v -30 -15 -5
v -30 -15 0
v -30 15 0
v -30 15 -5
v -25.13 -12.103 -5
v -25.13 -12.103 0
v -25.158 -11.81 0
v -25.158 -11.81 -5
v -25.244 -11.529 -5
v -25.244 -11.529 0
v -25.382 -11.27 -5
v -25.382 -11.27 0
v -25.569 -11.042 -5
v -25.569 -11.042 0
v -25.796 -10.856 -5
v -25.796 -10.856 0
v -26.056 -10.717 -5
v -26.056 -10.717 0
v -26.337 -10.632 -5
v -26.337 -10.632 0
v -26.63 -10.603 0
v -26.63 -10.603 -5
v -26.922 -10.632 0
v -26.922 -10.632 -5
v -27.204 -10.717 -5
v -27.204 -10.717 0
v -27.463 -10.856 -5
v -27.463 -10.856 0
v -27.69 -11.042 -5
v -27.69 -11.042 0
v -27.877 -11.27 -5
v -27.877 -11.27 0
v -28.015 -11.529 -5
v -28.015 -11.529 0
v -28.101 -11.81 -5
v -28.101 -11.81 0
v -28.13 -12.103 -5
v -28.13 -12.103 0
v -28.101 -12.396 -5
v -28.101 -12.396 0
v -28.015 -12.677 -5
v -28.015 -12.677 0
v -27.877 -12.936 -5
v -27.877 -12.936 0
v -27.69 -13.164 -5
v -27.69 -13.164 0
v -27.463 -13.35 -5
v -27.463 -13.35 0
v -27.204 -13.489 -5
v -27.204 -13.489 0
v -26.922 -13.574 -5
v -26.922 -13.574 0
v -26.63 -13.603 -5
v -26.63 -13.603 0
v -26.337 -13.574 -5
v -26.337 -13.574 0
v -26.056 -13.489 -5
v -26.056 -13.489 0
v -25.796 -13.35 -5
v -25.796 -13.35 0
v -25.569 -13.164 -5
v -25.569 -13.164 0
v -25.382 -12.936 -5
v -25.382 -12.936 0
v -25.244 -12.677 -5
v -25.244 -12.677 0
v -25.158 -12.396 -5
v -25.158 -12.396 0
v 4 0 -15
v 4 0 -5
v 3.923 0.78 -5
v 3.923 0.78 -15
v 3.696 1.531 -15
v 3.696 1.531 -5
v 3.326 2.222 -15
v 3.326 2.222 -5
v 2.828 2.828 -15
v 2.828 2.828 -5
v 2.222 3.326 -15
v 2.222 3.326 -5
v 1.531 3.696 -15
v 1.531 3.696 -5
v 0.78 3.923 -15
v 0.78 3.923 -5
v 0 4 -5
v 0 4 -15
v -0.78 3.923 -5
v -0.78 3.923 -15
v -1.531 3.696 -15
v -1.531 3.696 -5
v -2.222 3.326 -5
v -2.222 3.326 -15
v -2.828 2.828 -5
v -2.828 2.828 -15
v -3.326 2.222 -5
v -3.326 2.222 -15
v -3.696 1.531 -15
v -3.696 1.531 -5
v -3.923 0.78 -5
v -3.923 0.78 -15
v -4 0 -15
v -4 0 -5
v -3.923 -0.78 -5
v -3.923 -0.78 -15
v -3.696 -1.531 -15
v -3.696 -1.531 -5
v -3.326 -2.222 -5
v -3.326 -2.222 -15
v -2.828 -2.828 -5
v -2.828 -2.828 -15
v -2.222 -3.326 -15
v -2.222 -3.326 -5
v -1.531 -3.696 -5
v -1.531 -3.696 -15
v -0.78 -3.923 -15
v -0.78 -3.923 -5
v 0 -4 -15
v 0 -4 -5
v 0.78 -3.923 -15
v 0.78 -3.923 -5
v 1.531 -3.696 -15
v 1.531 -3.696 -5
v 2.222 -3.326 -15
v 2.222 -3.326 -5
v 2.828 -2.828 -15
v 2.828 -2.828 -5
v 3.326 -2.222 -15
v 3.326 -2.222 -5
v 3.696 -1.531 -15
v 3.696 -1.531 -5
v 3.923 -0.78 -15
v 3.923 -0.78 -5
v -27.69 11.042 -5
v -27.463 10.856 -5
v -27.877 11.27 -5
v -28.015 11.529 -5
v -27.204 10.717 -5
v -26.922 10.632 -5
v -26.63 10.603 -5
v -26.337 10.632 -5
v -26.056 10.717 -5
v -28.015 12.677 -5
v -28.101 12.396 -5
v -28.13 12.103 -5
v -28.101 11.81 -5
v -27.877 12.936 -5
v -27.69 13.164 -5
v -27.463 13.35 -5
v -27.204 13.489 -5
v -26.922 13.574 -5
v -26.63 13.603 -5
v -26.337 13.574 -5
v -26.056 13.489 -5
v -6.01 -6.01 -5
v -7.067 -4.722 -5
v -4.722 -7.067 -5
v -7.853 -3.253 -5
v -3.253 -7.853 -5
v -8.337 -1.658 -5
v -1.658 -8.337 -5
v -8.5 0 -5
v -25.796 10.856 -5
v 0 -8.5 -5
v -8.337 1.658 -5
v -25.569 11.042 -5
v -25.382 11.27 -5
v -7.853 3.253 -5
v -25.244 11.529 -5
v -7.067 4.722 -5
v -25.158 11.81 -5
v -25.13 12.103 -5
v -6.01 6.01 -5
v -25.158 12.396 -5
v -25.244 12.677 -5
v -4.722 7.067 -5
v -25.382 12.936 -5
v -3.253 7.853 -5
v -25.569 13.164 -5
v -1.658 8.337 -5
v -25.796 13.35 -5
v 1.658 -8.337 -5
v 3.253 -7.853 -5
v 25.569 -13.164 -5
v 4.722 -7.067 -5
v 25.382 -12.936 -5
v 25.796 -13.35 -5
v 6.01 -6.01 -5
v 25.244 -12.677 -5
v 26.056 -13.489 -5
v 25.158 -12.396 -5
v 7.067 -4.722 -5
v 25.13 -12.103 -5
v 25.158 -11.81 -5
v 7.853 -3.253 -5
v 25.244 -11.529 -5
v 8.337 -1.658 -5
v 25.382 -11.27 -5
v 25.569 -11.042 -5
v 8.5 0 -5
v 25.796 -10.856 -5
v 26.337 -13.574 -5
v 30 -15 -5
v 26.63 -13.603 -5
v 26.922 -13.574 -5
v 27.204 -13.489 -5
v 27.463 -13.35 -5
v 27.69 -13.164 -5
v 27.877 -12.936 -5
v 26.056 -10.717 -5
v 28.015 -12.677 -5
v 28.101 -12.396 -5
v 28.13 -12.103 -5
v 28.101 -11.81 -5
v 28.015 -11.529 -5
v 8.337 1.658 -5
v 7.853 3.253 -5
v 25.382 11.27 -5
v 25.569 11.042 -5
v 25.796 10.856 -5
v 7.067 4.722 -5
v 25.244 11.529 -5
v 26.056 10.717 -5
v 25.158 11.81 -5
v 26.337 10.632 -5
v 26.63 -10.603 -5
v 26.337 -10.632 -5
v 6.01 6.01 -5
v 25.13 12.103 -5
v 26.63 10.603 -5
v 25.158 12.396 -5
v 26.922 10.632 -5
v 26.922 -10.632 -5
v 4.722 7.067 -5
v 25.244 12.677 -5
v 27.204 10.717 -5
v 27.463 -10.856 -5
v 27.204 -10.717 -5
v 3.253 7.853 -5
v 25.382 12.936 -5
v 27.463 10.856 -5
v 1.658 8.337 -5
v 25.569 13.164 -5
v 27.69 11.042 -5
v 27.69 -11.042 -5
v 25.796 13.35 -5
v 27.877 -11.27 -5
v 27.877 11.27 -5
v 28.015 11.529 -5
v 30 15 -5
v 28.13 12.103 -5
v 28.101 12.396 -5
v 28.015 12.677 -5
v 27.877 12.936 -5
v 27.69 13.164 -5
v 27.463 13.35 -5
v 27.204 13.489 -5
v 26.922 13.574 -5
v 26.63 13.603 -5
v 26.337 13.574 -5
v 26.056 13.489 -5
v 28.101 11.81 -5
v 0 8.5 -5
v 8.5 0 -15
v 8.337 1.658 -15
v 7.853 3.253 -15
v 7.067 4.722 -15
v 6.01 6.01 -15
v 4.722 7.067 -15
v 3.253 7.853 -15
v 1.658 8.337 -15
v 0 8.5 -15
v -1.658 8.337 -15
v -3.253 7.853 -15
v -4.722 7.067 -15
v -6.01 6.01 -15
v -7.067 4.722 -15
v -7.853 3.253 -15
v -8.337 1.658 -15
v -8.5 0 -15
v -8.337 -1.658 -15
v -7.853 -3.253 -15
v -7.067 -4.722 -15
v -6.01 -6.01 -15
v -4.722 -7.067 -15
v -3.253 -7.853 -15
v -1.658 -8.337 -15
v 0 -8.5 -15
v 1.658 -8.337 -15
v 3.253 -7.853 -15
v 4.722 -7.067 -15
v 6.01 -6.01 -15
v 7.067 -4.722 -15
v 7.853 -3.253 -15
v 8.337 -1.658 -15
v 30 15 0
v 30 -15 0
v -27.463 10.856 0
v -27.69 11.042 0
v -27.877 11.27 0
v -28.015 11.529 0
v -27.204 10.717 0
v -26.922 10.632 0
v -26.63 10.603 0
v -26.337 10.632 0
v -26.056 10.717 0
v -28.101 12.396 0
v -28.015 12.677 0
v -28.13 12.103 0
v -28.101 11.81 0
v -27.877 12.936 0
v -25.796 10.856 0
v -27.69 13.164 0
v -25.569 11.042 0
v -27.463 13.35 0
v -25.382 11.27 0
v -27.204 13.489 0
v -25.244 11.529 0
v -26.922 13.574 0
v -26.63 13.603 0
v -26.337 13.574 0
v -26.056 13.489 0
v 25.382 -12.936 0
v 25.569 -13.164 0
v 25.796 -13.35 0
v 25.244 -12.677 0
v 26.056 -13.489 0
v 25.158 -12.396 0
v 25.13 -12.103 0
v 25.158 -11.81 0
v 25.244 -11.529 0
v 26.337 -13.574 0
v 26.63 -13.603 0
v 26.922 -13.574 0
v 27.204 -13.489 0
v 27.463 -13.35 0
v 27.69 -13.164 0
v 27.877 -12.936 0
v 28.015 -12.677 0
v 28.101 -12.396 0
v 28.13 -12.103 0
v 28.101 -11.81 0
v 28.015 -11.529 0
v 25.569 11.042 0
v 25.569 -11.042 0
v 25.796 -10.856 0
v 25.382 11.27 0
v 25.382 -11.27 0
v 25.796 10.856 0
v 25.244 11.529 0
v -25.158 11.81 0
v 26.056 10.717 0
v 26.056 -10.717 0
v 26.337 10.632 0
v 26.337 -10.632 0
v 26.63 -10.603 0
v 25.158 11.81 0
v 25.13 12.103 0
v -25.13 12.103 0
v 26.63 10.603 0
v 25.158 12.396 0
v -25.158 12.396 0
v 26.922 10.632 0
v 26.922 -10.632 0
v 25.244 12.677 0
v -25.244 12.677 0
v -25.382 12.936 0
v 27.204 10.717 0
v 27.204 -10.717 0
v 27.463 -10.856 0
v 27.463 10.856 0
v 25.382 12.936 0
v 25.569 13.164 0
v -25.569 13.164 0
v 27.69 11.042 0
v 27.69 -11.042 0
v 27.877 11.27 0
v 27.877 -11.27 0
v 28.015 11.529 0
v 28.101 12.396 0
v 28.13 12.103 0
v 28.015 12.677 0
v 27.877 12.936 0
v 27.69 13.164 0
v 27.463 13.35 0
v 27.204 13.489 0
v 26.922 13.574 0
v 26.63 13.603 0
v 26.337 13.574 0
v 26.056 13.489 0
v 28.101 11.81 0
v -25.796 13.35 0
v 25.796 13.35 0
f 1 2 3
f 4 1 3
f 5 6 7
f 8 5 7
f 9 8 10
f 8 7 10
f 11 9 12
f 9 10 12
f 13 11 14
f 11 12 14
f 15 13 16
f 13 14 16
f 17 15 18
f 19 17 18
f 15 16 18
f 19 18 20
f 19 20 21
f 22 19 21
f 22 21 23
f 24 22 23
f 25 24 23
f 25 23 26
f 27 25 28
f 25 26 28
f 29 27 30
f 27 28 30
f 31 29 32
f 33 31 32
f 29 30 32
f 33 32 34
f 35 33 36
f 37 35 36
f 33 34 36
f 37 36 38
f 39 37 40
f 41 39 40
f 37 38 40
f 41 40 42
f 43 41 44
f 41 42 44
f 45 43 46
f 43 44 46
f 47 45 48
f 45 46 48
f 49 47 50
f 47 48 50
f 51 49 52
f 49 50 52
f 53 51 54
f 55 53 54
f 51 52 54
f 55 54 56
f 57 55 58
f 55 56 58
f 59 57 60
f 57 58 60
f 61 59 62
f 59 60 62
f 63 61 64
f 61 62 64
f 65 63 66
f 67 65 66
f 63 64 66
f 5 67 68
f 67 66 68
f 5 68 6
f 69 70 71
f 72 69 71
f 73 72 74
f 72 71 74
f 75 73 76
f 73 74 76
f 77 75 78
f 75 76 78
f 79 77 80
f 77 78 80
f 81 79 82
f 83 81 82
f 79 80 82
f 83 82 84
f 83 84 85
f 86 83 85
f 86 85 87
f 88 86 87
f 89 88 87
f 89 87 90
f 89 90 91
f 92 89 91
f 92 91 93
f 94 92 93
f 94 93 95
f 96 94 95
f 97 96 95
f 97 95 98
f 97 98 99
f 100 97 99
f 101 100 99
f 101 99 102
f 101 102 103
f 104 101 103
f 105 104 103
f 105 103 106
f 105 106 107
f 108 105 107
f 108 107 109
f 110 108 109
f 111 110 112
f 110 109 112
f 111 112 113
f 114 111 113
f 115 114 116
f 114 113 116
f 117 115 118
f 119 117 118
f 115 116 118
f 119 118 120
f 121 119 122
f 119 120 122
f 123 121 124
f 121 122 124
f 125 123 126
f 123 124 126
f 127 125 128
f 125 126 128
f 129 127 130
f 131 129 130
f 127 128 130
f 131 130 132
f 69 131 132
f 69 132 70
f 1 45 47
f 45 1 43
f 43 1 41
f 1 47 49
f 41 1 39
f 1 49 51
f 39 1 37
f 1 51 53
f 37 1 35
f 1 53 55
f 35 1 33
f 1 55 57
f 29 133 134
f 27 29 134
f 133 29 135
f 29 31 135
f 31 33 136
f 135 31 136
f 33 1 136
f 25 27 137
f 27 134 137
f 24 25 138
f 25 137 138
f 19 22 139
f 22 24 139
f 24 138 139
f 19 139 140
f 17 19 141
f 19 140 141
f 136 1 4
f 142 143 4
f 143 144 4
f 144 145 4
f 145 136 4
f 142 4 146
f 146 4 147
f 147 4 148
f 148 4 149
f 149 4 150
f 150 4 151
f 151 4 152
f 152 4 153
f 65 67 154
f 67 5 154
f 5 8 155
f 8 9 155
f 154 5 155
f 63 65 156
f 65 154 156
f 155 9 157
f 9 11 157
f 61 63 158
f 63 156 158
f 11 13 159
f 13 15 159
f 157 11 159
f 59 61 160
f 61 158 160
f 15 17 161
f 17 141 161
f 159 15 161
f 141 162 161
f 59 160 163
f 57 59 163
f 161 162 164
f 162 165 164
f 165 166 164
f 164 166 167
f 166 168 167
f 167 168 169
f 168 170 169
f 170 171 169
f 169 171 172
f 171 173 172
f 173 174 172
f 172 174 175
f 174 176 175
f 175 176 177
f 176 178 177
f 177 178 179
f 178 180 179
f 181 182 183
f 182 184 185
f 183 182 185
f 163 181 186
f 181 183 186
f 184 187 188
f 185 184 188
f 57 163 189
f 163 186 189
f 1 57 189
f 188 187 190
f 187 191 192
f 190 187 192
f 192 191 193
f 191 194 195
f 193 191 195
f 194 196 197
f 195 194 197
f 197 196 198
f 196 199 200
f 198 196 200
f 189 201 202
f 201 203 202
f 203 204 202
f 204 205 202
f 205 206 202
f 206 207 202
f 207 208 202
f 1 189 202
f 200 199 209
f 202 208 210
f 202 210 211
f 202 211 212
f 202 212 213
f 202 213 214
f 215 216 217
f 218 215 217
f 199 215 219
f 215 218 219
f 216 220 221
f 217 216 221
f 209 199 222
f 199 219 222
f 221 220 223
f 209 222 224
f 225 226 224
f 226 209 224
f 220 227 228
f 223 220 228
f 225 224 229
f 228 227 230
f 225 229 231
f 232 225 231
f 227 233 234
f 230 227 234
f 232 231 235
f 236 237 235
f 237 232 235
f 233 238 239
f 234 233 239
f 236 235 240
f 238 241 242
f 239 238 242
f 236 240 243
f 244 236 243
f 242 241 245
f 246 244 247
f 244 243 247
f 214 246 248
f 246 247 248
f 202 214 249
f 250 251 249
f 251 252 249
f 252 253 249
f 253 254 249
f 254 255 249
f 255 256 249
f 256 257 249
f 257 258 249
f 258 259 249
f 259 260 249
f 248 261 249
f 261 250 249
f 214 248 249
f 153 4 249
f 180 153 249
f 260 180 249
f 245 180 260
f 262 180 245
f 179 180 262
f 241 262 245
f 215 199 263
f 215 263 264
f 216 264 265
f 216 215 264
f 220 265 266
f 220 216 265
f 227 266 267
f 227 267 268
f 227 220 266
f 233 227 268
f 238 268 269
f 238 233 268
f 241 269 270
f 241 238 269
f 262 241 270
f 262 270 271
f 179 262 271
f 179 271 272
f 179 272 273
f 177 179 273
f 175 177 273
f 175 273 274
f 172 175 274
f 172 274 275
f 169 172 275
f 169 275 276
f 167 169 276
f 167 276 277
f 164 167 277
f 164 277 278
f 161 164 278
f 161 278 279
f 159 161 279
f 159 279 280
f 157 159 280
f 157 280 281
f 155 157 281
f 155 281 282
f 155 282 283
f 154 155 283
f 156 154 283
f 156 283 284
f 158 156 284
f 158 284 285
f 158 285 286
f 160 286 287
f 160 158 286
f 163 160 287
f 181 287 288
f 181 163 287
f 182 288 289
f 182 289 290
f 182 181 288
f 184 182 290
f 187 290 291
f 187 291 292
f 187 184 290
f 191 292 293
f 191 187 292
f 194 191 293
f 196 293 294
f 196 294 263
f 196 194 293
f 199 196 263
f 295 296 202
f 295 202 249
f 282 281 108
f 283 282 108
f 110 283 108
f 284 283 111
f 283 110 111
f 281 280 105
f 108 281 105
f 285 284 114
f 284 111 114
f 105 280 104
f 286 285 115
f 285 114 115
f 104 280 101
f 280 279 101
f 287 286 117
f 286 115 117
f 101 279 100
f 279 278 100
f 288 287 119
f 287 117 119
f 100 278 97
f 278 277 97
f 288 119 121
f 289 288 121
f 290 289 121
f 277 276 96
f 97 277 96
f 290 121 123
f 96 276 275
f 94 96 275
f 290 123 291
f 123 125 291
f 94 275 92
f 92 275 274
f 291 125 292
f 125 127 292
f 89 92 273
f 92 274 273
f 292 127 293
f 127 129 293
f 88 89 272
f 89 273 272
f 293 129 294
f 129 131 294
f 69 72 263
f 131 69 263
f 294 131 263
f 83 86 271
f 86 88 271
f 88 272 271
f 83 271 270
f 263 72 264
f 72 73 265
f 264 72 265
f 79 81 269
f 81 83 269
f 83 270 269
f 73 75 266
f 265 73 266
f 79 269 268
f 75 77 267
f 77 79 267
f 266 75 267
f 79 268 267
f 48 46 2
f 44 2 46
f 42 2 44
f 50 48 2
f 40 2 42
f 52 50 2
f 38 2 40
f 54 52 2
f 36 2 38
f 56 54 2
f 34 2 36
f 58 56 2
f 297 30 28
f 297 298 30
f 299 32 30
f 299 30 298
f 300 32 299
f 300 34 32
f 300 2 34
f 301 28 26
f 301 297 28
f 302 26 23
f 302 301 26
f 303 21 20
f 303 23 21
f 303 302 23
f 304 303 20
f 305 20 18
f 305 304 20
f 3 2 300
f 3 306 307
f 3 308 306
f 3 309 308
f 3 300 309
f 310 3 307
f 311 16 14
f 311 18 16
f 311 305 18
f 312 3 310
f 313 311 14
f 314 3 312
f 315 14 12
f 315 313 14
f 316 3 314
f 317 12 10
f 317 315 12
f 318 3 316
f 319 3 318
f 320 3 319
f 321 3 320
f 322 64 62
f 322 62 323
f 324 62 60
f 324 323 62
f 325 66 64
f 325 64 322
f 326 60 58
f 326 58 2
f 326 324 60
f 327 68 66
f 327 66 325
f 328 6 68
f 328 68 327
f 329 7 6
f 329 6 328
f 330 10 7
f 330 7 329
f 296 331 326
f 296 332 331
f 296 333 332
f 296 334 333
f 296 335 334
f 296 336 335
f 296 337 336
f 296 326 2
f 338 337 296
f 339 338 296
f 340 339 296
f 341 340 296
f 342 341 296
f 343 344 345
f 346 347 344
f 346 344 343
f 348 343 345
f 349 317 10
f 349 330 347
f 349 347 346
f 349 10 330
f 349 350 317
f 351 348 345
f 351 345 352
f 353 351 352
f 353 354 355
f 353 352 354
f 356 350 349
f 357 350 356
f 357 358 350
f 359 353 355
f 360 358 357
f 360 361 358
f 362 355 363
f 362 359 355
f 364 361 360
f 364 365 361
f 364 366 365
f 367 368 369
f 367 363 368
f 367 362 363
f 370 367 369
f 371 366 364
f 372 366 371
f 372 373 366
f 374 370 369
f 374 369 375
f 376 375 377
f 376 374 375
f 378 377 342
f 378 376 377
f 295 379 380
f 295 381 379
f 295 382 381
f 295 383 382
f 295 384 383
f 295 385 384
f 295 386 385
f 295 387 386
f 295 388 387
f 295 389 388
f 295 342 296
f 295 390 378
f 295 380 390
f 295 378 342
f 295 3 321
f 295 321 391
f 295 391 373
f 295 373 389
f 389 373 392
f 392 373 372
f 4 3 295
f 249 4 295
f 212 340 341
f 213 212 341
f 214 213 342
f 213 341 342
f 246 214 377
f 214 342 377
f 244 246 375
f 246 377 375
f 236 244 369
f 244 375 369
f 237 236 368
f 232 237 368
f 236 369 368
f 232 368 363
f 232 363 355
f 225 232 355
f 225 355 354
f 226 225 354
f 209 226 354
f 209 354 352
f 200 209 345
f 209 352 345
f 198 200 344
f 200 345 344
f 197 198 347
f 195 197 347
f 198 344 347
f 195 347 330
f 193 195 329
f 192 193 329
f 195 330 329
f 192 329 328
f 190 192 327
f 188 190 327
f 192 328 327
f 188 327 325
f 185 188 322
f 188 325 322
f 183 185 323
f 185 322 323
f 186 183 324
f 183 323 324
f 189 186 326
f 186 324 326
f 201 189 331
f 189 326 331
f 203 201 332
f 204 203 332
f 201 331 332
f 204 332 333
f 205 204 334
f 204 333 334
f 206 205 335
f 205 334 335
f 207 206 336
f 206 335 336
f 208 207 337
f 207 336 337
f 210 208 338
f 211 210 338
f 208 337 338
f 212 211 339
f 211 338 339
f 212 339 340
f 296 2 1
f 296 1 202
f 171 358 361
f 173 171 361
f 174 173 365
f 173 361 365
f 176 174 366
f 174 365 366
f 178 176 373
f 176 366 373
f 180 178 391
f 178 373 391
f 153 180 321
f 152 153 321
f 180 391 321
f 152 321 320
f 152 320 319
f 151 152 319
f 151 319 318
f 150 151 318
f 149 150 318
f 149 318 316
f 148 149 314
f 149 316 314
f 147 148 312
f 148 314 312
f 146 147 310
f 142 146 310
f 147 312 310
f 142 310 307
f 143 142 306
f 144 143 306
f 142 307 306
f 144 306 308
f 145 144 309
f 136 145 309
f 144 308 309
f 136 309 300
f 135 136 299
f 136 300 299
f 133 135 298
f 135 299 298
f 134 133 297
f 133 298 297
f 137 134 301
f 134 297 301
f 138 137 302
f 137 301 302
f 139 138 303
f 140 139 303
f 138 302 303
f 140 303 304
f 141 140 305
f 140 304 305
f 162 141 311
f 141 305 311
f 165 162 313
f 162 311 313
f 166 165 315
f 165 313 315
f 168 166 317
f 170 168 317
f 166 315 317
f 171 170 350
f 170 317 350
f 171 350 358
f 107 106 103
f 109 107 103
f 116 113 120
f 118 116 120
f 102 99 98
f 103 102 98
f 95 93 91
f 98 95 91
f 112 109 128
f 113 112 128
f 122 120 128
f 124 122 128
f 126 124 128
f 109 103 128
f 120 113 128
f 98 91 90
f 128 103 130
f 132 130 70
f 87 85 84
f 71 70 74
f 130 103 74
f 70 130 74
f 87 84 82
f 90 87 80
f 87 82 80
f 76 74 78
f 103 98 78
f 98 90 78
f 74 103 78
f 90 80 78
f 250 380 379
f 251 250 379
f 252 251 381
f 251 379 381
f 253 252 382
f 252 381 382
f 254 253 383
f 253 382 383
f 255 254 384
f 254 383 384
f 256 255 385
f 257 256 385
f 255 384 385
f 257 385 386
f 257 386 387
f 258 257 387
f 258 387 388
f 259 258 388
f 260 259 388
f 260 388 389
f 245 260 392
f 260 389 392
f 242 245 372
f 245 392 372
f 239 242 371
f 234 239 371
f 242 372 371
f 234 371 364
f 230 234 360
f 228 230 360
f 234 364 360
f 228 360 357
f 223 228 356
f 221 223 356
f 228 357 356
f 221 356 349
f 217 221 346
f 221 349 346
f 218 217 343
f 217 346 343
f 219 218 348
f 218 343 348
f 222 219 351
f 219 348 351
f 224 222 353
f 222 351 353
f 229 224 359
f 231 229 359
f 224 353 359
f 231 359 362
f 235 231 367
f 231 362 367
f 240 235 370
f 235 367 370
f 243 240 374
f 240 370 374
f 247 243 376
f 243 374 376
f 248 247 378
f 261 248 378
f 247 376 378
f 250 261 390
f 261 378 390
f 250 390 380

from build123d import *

# Parameters (mm, degrees)
F2_W     = 60
F2_H     = 30
F2_R     = 1.5
F3_DEPTH = 5
F1_R     = 8.5
F1_R_2   = 4
F4_DEPTH = 15


with BuildPart() as f3:
    # F2 (on face) → F3 (new body)
    with BuildSketch(Plane.XY):
        Rectangle(F2_W, F2_H)
        with Locations((-26.629558, -12.103098)):
            Circle(F2_R, mode=Mode.SUBTRACT)
        with Locations((26.629558, -12.103098)):
            Circle(F2_R, mode=Mode.SUBTRACT)
        with Locations((-26.629558, 12.103098)):
            Circle(F2_R, mode=Mode.SUBTRACT)
        with Locations((26.629558, 12.103098)):
            Circle(F2_R, mode=Mode.SUBTRACT)
    extrude(amount=-F3_DEPTH)

    # F1 (on face) → F4 (join)
    with BuildSketch(Plane.XY):
        Circle(F1_R)
        Circle(F1_R_2, mode=Mode.SUBTRACT)
    extrude(amount=-F4_DEPTH)


solid = f3.part
